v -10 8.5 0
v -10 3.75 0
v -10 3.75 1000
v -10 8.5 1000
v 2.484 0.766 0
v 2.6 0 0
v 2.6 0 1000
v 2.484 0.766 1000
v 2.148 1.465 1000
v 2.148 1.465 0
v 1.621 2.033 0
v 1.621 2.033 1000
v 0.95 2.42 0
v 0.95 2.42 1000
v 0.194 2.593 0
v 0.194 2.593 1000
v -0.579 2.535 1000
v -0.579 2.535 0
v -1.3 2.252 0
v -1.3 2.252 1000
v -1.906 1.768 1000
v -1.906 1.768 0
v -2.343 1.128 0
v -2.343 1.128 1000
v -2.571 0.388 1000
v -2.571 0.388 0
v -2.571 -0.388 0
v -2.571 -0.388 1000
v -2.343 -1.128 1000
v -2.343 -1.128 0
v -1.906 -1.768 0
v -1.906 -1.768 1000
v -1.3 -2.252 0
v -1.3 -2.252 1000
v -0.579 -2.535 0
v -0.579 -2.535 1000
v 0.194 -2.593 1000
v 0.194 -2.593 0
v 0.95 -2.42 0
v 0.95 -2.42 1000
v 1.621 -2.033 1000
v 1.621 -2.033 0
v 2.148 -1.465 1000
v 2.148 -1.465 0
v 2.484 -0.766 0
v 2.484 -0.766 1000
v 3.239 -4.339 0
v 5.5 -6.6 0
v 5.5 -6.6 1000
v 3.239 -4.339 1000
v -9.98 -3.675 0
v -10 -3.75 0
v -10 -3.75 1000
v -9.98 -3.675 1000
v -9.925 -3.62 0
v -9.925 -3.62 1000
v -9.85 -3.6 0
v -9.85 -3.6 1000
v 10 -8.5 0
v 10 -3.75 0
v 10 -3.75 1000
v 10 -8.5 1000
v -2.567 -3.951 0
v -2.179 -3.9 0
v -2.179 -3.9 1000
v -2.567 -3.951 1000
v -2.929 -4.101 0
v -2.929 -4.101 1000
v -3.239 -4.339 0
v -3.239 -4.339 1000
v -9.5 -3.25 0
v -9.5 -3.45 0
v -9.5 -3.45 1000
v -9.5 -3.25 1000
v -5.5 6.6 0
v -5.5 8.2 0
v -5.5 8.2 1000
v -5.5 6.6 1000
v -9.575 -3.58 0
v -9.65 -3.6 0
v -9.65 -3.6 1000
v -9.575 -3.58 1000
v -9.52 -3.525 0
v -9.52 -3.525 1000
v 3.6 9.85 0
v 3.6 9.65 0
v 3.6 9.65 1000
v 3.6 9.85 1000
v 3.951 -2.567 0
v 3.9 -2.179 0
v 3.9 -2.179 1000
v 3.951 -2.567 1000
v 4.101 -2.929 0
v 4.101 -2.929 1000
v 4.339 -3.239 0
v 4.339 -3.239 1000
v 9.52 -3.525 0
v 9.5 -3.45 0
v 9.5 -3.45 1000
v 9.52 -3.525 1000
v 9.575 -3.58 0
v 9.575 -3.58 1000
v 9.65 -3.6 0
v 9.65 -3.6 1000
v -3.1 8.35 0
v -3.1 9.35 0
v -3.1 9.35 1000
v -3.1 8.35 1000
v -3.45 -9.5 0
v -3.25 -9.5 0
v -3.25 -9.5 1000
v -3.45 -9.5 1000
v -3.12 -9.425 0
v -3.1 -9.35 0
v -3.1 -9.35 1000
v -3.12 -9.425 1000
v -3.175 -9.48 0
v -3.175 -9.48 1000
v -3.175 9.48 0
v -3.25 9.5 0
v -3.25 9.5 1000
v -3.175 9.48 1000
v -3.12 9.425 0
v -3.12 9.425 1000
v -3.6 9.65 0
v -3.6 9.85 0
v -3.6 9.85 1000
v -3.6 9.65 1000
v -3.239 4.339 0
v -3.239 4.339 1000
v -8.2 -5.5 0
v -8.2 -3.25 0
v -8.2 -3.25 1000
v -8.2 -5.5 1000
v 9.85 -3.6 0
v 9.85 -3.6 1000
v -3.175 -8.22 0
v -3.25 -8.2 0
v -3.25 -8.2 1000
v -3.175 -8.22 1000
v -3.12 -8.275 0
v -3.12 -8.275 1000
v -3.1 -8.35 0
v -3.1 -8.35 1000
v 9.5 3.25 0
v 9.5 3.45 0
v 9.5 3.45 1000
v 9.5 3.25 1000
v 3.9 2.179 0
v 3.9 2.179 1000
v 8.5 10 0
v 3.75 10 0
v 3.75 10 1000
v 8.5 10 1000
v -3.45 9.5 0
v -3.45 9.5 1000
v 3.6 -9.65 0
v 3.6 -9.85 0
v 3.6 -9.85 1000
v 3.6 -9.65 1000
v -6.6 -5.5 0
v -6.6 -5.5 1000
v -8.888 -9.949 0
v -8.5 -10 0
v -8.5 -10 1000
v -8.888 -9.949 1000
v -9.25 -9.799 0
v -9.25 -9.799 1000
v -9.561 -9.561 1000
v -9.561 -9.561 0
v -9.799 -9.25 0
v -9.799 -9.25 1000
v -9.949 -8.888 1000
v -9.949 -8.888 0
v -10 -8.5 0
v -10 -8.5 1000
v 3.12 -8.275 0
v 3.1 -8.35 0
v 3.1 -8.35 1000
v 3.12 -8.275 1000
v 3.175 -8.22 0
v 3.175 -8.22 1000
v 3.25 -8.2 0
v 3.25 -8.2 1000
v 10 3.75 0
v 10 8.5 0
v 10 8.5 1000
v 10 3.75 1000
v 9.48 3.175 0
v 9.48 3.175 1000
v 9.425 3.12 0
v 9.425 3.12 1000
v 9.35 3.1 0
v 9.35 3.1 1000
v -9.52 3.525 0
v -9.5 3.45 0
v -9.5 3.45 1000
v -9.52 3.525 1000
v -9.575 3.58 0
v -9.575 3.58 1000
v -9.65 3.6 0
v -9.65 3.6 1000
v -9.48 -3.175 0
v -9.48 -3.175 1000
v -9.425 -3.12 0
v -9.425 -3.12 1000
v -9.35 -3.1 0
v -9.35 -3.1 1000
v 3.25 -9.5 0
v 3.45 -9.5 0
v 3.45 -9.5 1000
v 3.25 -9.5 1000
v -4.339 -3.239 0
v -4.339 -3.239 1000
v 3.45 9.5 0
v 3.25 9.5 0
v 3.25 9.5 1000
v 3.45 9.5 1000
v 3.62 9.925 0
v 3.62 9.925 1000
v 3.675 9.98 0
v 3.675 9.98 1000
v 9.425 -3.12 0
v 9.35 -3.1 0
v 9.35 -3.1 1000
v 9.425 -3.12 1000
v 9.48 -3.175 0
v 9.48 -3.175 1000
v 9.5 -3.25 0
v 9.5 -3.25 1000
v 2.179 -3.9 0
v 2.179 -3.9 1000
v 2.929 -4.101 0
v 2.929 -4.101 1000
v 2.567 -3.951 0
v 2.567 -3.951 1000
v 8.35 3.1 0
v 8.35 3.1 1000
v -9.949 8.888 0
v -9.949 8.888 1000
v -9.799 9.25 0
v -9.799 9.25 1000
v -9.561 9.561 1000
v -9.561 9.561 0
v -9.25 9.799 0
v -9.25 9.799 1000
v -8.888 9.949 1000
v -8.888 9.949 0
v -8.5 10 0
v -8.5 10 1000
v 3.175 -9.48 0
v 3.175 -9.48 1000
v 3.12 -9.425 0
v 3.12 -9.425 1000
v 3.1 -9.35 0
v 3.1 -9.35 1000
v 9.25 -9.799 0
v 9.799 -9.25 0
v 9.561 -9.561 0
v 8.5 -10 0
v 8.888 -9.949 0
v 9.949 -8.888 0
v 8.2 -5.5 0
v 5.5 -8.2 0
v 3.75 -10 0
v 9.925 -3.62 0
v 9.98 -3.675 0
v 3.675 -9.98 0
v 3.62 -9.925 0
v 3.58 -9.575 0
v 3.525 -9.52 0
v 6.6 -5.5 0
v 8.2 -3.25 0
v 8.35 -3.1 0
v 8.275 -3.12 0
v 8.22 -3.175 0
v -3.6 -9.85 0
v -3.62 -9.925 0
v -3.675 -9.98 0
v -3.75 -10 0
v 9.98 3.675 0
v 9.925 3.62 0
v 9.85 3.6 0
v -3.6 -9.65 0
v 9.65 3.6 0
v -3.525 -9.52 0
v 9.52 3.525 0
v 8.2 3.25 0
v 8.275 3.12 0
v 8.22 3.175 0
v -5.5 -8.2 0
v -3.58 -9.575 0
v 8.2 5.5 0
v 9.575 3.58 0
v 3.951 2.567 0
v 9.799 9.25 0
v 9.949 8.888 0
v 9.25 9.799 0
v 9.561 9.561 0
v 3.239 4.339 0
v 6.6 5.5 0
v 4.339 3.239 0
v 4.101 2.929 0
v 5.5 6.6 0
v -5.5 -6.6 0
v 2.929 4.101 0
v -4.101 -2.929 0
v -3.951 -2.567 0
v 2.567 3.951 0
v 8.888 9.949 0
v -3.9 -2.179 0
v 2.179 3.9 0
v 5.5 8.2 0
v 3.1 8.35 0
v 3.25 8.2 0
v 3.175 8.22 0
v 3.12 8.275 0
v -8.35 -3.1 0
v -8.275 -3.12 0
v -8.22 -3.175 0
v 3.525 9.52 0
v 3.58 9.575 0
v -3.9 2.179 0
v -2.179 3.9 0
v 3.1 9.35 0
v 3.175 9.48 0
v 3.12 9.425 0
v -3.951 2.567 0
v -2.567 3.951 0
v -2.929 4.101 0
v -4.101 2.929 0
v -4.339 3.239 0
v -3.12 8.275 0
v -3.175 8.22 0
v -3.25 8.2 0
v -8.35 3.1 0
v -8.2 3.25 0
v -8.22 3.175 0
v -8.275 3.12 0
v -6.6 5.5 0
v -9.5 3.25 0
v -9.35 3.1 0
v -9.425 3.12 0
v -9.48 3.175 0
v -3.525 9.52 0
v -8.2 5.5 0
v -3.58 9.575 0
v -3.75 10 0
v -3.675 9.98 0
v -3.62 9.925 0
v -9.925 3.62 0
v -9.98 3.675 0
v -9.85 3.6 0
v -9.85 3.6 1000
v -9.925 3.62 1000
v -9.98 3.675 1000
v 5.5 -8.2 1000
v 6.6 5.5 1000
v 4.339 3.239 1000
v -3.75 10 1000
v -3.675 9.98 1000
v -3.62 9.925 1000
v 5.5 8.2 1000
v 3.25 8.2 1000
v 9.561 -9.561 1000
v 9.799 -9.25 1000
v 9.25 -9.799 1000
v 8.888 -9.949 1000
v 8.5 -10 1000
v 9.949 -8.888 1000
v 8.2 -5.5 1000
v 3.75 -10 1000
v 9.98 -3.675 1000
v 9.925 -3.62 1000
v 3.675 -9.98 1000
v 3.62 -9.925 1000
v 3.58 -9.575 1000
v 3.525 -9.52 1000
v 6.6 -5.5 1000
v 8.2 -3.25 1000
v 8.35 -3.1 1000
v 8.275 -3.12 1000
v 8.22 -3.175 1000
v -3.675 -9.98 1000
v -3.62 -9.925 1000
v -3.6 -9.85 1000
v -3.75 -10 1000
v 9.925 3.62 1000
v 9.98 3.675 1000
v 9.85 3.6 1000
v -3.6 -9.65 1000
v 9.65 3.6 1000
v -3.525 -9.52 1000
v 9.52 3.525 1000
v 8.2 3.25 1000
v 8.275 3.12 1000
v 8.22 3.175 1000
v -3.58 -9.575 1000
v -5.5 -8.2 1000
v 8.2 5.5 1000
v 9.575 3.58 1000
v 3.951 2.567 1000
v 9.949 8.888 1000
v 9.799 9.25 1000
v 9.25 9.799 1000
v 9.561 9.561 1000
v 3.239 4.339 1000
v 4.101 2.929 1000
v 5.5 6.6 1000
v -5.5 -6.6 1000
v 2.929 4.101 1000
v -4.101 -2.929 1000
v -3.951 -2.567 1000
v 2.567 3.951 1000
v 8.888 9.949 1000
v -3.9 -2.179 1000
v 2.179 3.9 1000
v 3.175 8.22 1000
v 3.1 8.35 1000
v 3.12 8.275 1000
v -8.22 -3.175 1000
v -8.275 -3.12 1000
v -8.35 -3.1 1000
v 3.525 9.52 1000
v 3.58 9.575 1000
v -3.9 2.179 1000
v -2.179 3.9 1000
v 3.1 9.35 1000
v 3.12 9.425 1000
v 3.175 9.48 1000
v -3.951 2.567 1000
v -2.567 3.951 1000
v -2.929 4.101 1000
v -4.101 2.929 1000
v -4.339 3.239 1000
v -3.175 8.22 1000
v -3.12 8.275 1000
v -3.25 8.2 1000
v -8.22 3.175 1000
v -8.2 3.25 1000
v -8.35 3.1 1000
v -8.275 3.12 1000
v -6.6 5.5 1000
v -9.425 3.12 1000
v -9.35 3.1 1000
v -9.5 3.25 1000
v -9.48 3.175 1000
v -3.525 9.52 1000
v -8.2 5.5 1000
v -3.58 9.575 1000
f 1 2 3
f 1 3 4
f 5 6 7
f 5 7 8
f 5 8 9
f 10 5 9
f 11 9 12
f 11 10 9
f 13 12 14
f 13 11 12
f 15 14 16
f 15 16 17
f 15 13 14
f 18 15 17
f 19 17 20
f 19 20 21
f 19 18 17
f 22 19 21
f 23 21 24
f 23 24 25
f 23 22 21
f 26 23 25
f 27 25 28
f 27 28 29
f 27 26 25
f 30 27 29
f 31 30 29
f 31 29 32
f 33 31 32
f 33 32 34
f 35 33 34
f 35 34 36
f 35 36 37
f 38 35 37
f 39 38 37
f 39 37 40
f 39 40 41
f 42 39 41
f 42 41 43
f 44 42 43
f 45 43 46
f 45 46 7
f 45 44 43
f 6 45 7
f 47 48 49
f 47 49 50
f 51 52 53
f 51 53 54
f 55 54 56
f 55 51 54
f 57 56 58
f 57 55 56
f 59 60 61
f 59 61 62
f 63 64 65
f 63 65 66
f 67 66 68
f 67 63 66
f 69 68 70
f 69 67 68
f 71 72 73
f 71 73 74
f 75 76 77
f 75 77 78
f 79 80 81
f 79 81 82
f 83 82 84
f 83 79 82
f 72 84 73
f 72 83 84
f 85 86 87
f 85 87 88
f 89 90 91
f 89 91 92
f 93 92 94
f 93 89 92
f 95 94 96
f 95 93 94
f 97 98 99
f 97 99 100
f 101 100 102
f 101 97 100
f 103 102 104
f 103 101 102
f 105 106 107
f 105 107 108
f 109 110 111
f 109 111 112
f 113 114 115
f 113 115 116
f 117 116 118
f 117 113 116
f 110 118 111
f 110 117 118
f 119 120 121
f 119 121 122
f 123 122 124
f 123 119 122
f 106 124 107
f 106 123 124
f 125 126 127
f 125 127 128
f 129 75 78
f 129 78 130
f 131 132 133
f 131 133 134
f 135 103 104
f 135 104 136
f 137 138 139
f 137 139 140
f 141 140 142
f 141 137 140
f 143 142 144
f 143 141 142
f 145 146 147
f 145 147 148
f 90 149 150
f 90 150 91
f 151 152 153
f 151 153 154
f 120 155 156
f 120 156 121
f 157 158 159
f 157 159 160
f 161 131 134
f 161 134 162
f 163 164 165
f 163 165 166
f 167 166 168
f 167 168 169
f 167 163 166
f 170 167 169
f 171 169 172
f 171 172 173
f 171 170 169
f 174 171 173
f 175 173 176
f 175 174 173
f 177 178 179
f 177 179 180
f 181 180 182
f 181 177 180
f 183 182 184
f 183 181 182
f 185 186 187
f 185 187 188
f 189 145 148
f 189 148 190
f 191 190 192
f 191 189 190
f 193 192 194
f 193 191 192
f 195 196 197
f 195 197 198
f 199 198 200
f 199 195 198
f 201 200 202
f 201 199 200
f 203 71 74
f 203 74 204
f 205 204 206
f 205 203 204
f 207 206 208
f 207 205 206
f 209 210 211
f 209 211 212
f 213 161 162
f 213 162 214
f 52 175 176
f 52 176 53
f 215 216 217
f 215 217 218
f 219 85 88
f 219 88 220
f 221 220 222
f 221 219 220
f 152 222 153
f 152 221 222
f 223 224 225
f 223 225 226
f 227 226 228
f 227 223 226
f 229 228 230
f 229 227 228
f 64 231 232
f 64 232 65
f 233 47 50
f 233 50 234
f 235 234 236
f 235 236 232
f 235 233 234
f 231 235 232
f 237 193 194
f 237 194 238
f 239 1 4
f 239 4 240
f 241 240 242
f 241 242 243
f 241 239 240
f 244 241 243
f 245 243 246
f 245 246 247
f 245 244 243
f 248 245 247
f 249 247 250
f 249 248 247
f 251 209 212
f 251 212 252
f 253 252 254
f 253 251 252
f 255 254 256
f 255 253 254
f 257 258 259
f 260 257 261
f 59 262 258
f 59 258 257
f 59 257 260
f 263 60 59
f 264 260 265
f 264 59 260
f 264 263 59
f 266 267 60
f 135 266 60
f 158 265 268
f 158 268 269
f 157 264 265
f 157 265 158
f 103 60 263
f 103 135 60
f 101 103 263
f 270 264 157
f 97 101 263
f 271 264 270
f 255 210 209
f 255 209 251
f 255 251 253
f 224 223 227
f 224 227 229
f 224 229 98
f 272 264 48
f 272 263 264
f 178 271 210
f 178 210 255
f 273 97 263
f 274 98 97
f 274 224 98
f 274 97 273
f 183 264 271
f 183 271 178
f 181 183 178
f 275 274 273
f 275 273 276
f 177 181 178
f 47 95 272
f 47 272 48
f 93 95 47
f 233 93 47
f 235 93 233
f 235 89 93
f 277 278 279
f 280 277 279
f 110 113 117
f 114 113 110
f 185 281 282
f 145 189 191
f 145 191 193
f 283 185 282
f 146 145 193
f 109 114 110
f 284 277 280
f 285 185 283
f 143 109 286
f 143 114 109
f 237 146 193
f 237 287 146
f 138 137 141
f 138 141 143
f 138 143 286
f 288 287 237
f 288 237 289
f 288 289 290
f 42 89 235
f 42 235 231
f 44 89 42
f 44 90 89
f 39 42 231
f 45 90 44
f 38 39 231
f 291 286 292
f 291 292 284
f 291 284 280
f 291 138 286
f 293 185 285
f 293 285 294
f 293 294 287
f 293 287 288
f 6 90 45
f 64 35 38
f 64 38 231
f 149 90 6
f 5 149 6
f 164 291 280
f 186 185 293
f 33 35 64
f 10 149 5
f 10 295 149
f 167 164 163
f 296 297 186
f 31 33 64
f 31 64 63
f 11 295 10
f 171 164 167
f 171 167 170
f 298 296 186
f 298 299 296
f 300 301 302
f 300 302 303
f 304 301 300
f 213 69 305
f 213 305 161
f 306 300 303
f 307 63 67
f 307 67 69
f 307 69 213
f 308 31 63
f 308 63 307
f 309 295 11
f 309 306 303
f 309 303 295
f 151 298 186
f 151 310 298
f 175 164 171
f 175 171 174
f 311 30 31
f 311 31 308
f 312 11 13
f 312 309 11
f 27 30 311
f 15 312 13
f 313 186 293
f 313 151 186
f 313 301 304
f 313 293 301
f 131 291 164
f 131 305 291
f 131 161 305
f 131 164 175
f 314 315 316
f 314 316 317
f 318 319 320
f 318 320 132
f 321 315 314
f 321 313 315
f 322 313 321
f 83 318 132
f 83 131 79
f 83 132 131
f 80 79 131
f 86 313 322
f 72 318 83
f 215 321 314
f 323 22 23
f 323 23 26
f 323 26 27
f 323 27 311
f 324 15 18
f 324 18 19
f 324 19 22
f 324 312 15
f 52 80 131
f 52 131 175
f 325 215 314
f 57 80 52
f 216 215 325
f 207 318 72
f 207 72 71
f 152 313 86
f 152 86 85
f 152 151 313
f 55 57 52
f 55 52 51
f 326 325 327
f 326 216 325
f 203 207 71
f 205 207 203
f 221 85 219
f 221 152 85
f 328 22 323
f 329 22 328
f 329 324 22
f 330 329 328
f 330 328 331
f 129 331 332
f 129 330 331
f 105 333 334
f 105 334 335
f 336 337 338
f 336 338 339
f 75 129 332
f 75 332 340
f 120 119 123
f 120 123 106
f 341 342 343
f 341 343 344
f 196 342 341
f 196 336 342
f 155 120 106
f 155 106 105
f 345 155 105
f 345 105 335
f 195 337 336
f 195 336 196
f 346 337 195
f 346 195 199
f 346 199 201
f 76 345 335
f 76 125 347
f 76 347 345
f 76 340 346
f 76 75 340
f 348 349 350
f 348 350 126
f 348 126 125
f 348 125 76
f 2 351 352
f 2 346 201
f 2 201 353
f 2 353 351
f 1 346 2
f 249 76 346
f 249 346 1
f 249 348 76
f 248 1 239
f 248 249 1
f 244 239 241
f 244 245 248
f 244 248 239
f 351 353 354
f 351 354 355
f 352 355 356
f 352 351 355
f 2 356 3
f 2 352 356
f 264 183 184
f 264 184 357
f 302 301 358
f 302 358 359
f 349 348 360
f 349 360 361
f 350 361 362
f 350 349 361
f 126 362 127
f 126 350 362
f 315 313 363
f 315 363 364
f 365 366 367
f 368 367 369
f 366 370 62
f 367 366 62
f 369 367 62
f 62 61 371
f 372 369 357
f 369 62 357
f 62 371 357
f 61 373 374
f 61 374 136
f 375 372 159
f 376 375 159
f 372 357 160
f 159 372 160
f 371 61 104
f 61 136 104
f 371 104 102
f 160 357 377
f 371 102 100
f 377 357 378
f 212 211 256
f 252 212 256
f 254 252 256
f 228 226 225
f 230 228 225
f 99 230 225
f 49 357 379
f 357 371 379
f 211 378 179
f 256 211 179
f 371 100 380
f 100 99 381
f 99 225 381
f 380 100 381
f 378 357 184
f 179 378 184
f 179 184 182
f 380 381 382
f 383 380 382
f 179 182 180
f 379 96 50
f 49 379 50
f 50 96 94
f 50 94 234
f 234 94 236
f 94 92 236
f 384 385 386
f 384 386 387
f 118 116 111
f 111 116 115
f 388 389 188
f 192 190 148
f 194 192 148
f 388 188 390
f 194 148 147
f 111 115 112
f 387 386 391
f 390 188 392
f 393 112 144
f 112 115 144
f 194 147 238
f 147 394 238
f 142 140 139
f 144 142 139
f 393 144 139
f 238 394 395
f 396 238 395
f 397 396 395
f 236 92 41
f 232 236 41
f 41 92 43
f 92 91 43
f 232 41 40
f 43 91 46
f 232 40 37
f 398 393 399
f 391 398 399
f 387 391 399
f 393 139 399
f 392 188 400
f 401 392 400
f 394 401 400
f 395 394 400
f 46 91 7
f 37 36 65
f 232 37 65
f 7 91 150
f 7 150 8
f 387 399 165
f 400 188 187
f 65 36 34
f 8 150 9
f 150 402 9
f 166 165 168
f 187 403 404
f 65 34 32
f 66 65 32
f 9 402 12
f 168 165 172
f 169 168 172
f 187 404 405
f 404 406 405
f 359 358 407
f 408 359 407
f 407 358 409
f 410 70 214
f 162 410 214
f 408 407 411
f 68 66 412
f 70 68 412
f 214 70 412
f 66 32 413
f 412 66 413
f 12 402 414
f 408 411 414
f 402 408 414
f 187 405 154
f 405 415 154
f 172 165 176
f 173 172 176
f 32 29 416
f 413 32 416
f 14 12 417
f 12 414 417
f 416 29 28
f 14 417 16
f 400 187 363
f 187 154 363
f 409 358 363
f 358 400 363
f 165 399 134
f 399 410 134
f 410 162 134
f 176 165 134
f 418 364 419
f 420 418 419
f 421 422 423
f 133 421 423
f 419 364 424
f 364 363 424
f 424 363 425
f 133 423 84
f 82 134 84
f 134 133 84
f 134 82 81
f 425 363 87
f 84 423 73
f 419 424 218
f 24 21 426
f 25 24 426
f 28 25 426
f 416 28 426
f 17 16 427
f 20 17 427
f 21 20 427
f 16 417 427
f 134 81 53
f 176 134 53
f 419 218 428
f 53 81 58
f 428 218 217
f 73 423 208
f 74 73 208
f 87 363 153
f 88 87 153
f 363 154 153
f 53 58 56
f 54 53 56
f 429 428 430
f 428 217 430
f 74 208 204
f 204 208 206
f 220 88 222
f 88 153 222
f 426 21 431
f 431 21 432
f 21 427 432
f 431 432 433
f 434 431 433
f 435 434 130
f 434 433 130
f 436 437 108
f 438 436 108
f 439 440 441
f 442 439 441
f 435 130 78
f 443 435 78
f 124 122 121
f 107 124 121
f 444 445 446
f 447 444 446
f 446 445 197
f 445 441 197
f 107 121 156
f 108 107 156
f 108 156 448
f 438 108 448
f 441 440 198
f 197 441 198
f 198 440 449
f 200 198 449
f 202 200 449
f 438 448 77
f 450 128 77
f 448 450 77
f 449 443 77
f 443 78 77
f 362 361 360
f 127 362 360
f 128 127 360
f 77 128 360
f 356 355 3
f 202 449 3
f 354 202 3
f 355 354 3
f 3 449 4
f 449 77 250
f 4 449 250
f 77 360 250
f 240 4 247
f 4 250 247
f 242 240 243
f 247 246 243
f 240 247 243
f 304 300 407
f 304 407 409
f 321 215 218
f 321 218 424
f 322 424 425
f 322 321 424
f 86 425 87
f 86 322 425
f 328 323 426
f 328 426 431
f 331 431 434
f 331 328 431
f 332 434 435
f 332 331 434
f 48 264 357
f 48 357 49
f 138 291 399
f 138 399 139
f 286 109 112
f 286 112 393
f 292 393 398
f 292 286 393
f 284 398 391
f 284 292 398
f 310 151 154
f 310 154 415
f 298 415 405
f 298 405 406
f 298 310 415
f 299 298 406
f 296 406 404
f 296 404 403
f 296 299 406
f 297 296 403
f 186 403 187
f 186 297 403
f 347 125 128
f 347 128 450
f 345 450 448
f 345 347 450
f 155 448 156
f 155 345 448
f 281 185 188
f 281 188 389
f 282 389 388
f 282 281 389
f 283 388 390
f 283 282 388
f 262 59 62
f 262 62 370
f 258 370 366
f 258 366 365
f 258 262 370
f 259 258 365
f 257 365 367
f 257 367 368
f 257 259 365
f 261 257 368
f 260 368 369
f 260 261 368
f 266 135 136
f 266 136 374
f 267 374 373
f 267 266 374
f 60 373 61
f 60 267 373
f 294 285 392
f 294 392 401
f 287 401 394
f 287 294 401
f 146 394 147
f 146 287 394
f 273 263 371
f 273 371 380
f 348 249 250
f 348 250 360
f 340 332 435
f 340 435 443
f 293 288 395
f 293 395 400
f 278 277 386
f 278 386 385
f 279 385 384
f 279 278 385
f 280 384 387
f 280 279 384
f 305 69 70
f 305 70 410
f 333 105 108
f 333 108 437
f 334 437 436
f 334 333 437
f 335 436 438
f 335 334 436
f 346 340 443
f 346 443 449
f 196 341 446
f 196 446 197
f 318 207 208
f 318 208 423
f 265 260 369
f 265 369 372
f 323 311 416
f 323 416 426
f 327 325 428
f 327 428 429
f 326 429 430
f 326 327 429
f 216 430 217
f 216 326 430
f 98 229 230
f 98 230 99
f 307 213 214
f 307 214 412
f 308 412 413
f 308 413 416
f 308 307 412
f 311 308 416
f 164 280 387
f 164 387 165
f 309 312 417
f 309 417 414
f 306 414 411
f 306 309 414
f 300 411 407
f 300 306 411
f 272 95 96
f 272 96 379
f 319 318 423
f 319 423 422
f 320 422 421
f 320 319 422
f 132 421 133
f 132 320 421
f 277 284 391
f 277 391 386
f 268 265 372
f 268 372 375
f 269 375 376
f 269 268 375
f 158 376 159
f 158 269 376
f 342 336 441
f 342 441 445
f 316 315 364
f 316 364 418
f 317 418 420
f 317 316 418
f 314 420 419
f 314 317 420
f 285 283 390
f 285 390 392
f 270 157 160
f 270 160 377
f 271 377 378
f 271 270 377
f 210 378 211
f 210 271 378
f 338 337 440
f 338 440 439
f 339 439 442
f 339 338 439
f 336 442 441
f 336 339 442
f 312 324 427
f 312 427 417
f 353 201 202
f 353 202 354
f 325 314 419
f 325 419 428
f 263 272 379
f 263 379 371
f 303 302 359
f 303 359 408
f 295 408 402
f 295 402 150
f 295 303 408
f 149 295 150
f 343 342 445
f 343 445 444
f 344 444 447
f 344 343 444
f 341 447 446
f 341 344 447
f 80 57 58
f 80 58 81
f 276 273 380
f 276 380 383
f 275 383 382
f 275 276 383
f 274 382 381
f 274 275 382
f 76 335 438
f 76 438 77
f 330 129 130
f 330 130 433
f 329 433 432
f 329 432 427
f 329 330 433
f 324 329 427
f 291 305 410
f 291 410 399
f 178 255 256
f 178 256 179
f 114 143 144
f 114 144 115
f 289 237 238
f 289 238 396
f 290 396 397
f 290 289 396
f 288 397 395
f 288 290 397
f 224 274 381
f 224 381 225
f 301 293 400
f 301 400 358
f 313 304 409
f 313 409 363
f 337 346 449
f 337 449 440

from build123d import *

# Parameters (mm, degrees)
SKETCH_3_R      = 2.6
EXTRUDE_1_DEPTH = 1000


with BuildPart() as part:
    # Эскиз3 → Бобышка-Вытянуть1 (new body)
    with BuildSketch(Plane.XY):
        with BuildLine():
            Line((-10, 5.5), (-10, 8.5))
            ThreePointArc((-10, 8.5), (-9.560660172, 9.560660172), (-8.5, 10))
            Line((-8.5, 10), (-5.5, 10))
            Line((-5.5, 10), (-3.75, 10))
            ThreePointArc((-3.75, 10), (-3.643933983, 9.956066017), (-3.6, 9.85))
            Line((-3.6, 9.85), (-3.6, 9.65))
            ThreePointArc((-3.6, 9.65), (-3.556066017, 9.543933983), (-3.45, 9.5))
            Line((-3.45, 9.5), (-3.25, 9.5))
            ThreePointArc((-3.25, 9.5), (-3.143933983, 9.456066017), (-3.1, 9.35))
            Line((-3.1, 9.35), (-3.1, 8.35))
            ThreePointArc((-3.1, 8.35), (-3.143933983, 8.243933983), (-3.25, 8.2))
            Line((-3.25, 8.2), (-5.5, 8.2))
            Line((-5.5, 8.2), (-5.5, 6.6))
            Line((-5.5, 6.6), (-3.239339828, 4.339339828))
            ThreePointArc((-3.239339828, 4.339339828), (-2.752704805, 4.014180701), (-2.178679656, 3.9))
            Line((-2.178679656, 3.9), (2.178679656, 3.9))
            ThreePointArc((2.178679656, 3.9), (2.752704805, 4.014180701), (3.239339828, 4.339339828))
            Line((3.239339828, 4.339339828), (5.5, 6.6))
            Line((5.5, 6.6), (5.5, 8.2))
            Line((5.5, 8.2), (3.25, 8.2))
            ThreePointArc((3.25, 8.2), (3.143933983, 8.243933983), (3.1, 8.35))
            Line((3.1, 8.35), (3.1, 9.35))
            ThreePointArc((3.1, 9.35), (3.143933983, 9.456066017), (3.25, 9.5))
            Line((3.25, 9.5), (3.45, 9.5))
            ThreePointArc((3.45, 9.5), (3.556066017, 9.543933983), (3.6, 9.65))
            Line((3.6, 9.65), (3.6, 9.85))
            ThreePointArc((3.6, 9.85), (3.643933983, 9.956066017), (3.75, 10))
            Line((3.75, 10), (5.5, 10))
            Line((5.5, 10), (8.5, 10))
            ThreePointArc((8.5, 10), (9.560660172, 9.560660172), (10, 8.5))
            Line((10, 8.5), (10, 5.5))
            Line((10, 5.5), (10, 3.75))
            ThreePointArc((10, 3.75), (9.956066017, 3.643933983), (9.85, 3.6))
            Line((9.85, 3.6), (9.65, 3.6))
            ThreePointArc((9.65, 3.6), (9.543933983, 3.556066017), (9.5, 3.45))
            Line((9.5, 3.45), (9.5, 3.25))
            ThreePointArc((9.5, 3.25), (9.456066017, 3.143933983), (9.35, 3.1))
            Line((9.35, 3.1), (8.35, 3.1))
            ThreePointArc((8.35, 3.1), (8.243933983, 3.143933983), (8.2, 3.25))
            Line((8.2, 3.25), (8.2, 5.5))
            Line((8.2, 5.5), (6.6, 5.5))
            Line((6.6, 5.5), (4.339339828, 3.239339828))
            ThreePointArc((4.339339828, 3.239339828), (4.014180701, 2.752704805), (3.9, 2.178679656))
            Line((3.9, 2.178679656), (3.9, -2.178679656))
            ThreePointArc((3.9, -2.178679656), (4.014180701, -2.752704805), (4.339339828, -3.239339828))
            Line((4.339339828, -3.239339828), (6.6, -5.5))
            Line((6.6, -5.5), (8.2, -5.5))
            Line((8.2, -5.5), (8.2, -3.25))
            ThreePointArc((8.2, -3.25), (8.243933983, -3.143933983), (8.35, -3.1))
            Line((8.35, -3.1), (9.35, -3.1))
            ThreePointArc((9.35, -3.1), (9.456066017, -3.143933983), (9.5, -3.25))
            Line((9.5, -3.25), (9.5, -3.45))
            ThreePointArc((9.5, -3.45), (9.543933983, -3.556066017), (9.65, -3.6))
            Line((9.65, -3.6), (9.85, -3.6))
            ThreePointArc((9.85, -3.6), (9.956066017, -3.643933983), (10, -3.75))
            Line((10, -3.75), (10, -5.5))
            Line((10, -5.5), (10, -8.5))
            ThreePointArc((10, -8.5), (9.560660172, -9.560660172), (8.5, -10))
            Line((8.5, -10), (5.5, -10))
            Line((5.5, -10), (3.75, -10))
            ThreePointArc((3.75, -10), (3.643933983, -9.956066017), (3.6, -9.85))
            Line((3.6, -9.85), (3.6, -9.65))
            ThreePointArc((3.6, -9.65), (3.556066017, -9.543933983), (3.45, -9.5))
            Line((3.45, -9.5), (3.25, -9.5))
            ThreePointArc((3.25, -9.5), (3.143933983, -9.456066017), (3.1, -9.35))
            Line((3.1, -9.35), (3.1, -8.35))
            ThreePointArc((3.1, -8.35), (3.143933983, -8.243933983), (3.25, -8.2))
            Line((3.25, -8.2), (5.5, -8.2))
            Line((5.5, -8.2), (5.5, -6.6))
            Line((5.5, -6.6), (3.239339828, -4.339339828))
            ThreePointArc((3.239339828, -4.339339828), (2.752704805, -4.014180701), (2.178679656, -3.9))
            Line((2.178679656, -3.9), (-2.178679656, -3.9))
            ThreePointArc((-2.178679656, -3.9), (-2.752704805, -4.014180701), (-3.239339828, -4.339339828))
            Line((-3.239339828, -4.339339828), (-5.5, -6.6))
            Line((-5.5, -6.6), (-5.5, -8.2))
            Line((-5.5, -8.2), (-3.25, -8.2))
            ThreePointArc((-3.25, -8.2), (-3.143933983, -8.243933983), (-3.1, -8.35))
            Line((-3.1, -8.35), (-3.1, -9.35))
            ThreePointArc((-3.1, -9.35), (-3.143933983, -9.456066017), (-3.25, -9.5))
            Line((-3.25, -9.5), (-3.45, -9.5))
            ThreePointArc((-3.45, -9.5), (-3.556066017, -9.543933983), (-3.6, -9.65))
            Line((-3.6, -9.65), (-3.6, -9.85))
            ThreePointArc((-3.6, -9.85), (-3.643933983, -9.956066017), (-3.75, -10))
            Line((-3.75, -10), (-5.5, -10))
            Line((-5.5, -10), (-8.5, -10))
            ThreePointArc((-8.5, -10), (-9.560660172, -9.560660172), (-10, -8.5))
            Line((-10, -8.5), (-10, -5.5))
            Line((-10, -5.5), (-10, -3.75))
            ThreePointArc((-10, -3.75), (-9.956066017, -3.643933983), (-9.85, -3.6))
            Line((-9.85, -3.6), (-9.65, -3.6))
            ThreePointArc((-9.65, -3.6), (-9.543933983, -3.556066017), (-9.5, -3.45))
            Line((-9.5, -3.45), (-9.5, -3.25))
            ThreePointArc((-9.5, -3.25), (-9.456066017, -3.143933983), (-9.35, -3.1))
            Line((-9.35, -3.1), (-8.35, -3.1))
            ThreePointArc((-8.35, -3.1), (-8.243933983, -3.143933983), (-8.2, -3.25))
            Line((-8.2, -3.25), (-8.2, -5.5))
            Line((-8.2, -5.5), (-6.6, -5.5))
            Line((-6.6, -5.5), (-4.339339828, -3.239339828))
            ThreePointArc((-4.339339828, -3.239339828), (-4.014180701, -2.752704805), (-3.9, -2.178679656))
            Line((-3.9, -2.178679656), (-3.9, 2.178679656))
            ThreePointArc((-3.9, 2.178679656), (-4.014180701, 2.752704805), (-4.339339828, 3.239339828))
            Line((-4.339339828, 3.239339828), (-6.6, 5.5))
            Line((-6.6, 5.5), (-8.2, 5.5))
            Line((-8.2, 5.5), (-8.2, 3.25))
            ThreePointArc((-8.2, 3.25), (-8.243933983, 3.143933983), (-8.35, 3.1))
            Line((-8.35, 3.1), (-9.35, 3.1))
            ThreePointArc((-9.35, 3.1), (-9.456066017, 3.143933983), (-9.5, 3.25))
            Line((-9.5, 3.25), (-9.5, 3.45))
            ThreePointArc((-9.5, 3.45), (-9.543933983, 3.556066017), (-9.65, 3.6))
            Line((-9.65, 3.6), (-9.85, 3.6))
            ThreePointArc((-9.85, 3.6), (-9.956066017, 3.643933983), (-10, 3.75))
            Line((-10, 3.75), (-10, 5.5))
        make_face()
        Circle(SKETCH_3_R, mode=Mode.SUBTRACT)
    extrude(amount=EXTRUDE_1_DEPTH)


solid = part.part
